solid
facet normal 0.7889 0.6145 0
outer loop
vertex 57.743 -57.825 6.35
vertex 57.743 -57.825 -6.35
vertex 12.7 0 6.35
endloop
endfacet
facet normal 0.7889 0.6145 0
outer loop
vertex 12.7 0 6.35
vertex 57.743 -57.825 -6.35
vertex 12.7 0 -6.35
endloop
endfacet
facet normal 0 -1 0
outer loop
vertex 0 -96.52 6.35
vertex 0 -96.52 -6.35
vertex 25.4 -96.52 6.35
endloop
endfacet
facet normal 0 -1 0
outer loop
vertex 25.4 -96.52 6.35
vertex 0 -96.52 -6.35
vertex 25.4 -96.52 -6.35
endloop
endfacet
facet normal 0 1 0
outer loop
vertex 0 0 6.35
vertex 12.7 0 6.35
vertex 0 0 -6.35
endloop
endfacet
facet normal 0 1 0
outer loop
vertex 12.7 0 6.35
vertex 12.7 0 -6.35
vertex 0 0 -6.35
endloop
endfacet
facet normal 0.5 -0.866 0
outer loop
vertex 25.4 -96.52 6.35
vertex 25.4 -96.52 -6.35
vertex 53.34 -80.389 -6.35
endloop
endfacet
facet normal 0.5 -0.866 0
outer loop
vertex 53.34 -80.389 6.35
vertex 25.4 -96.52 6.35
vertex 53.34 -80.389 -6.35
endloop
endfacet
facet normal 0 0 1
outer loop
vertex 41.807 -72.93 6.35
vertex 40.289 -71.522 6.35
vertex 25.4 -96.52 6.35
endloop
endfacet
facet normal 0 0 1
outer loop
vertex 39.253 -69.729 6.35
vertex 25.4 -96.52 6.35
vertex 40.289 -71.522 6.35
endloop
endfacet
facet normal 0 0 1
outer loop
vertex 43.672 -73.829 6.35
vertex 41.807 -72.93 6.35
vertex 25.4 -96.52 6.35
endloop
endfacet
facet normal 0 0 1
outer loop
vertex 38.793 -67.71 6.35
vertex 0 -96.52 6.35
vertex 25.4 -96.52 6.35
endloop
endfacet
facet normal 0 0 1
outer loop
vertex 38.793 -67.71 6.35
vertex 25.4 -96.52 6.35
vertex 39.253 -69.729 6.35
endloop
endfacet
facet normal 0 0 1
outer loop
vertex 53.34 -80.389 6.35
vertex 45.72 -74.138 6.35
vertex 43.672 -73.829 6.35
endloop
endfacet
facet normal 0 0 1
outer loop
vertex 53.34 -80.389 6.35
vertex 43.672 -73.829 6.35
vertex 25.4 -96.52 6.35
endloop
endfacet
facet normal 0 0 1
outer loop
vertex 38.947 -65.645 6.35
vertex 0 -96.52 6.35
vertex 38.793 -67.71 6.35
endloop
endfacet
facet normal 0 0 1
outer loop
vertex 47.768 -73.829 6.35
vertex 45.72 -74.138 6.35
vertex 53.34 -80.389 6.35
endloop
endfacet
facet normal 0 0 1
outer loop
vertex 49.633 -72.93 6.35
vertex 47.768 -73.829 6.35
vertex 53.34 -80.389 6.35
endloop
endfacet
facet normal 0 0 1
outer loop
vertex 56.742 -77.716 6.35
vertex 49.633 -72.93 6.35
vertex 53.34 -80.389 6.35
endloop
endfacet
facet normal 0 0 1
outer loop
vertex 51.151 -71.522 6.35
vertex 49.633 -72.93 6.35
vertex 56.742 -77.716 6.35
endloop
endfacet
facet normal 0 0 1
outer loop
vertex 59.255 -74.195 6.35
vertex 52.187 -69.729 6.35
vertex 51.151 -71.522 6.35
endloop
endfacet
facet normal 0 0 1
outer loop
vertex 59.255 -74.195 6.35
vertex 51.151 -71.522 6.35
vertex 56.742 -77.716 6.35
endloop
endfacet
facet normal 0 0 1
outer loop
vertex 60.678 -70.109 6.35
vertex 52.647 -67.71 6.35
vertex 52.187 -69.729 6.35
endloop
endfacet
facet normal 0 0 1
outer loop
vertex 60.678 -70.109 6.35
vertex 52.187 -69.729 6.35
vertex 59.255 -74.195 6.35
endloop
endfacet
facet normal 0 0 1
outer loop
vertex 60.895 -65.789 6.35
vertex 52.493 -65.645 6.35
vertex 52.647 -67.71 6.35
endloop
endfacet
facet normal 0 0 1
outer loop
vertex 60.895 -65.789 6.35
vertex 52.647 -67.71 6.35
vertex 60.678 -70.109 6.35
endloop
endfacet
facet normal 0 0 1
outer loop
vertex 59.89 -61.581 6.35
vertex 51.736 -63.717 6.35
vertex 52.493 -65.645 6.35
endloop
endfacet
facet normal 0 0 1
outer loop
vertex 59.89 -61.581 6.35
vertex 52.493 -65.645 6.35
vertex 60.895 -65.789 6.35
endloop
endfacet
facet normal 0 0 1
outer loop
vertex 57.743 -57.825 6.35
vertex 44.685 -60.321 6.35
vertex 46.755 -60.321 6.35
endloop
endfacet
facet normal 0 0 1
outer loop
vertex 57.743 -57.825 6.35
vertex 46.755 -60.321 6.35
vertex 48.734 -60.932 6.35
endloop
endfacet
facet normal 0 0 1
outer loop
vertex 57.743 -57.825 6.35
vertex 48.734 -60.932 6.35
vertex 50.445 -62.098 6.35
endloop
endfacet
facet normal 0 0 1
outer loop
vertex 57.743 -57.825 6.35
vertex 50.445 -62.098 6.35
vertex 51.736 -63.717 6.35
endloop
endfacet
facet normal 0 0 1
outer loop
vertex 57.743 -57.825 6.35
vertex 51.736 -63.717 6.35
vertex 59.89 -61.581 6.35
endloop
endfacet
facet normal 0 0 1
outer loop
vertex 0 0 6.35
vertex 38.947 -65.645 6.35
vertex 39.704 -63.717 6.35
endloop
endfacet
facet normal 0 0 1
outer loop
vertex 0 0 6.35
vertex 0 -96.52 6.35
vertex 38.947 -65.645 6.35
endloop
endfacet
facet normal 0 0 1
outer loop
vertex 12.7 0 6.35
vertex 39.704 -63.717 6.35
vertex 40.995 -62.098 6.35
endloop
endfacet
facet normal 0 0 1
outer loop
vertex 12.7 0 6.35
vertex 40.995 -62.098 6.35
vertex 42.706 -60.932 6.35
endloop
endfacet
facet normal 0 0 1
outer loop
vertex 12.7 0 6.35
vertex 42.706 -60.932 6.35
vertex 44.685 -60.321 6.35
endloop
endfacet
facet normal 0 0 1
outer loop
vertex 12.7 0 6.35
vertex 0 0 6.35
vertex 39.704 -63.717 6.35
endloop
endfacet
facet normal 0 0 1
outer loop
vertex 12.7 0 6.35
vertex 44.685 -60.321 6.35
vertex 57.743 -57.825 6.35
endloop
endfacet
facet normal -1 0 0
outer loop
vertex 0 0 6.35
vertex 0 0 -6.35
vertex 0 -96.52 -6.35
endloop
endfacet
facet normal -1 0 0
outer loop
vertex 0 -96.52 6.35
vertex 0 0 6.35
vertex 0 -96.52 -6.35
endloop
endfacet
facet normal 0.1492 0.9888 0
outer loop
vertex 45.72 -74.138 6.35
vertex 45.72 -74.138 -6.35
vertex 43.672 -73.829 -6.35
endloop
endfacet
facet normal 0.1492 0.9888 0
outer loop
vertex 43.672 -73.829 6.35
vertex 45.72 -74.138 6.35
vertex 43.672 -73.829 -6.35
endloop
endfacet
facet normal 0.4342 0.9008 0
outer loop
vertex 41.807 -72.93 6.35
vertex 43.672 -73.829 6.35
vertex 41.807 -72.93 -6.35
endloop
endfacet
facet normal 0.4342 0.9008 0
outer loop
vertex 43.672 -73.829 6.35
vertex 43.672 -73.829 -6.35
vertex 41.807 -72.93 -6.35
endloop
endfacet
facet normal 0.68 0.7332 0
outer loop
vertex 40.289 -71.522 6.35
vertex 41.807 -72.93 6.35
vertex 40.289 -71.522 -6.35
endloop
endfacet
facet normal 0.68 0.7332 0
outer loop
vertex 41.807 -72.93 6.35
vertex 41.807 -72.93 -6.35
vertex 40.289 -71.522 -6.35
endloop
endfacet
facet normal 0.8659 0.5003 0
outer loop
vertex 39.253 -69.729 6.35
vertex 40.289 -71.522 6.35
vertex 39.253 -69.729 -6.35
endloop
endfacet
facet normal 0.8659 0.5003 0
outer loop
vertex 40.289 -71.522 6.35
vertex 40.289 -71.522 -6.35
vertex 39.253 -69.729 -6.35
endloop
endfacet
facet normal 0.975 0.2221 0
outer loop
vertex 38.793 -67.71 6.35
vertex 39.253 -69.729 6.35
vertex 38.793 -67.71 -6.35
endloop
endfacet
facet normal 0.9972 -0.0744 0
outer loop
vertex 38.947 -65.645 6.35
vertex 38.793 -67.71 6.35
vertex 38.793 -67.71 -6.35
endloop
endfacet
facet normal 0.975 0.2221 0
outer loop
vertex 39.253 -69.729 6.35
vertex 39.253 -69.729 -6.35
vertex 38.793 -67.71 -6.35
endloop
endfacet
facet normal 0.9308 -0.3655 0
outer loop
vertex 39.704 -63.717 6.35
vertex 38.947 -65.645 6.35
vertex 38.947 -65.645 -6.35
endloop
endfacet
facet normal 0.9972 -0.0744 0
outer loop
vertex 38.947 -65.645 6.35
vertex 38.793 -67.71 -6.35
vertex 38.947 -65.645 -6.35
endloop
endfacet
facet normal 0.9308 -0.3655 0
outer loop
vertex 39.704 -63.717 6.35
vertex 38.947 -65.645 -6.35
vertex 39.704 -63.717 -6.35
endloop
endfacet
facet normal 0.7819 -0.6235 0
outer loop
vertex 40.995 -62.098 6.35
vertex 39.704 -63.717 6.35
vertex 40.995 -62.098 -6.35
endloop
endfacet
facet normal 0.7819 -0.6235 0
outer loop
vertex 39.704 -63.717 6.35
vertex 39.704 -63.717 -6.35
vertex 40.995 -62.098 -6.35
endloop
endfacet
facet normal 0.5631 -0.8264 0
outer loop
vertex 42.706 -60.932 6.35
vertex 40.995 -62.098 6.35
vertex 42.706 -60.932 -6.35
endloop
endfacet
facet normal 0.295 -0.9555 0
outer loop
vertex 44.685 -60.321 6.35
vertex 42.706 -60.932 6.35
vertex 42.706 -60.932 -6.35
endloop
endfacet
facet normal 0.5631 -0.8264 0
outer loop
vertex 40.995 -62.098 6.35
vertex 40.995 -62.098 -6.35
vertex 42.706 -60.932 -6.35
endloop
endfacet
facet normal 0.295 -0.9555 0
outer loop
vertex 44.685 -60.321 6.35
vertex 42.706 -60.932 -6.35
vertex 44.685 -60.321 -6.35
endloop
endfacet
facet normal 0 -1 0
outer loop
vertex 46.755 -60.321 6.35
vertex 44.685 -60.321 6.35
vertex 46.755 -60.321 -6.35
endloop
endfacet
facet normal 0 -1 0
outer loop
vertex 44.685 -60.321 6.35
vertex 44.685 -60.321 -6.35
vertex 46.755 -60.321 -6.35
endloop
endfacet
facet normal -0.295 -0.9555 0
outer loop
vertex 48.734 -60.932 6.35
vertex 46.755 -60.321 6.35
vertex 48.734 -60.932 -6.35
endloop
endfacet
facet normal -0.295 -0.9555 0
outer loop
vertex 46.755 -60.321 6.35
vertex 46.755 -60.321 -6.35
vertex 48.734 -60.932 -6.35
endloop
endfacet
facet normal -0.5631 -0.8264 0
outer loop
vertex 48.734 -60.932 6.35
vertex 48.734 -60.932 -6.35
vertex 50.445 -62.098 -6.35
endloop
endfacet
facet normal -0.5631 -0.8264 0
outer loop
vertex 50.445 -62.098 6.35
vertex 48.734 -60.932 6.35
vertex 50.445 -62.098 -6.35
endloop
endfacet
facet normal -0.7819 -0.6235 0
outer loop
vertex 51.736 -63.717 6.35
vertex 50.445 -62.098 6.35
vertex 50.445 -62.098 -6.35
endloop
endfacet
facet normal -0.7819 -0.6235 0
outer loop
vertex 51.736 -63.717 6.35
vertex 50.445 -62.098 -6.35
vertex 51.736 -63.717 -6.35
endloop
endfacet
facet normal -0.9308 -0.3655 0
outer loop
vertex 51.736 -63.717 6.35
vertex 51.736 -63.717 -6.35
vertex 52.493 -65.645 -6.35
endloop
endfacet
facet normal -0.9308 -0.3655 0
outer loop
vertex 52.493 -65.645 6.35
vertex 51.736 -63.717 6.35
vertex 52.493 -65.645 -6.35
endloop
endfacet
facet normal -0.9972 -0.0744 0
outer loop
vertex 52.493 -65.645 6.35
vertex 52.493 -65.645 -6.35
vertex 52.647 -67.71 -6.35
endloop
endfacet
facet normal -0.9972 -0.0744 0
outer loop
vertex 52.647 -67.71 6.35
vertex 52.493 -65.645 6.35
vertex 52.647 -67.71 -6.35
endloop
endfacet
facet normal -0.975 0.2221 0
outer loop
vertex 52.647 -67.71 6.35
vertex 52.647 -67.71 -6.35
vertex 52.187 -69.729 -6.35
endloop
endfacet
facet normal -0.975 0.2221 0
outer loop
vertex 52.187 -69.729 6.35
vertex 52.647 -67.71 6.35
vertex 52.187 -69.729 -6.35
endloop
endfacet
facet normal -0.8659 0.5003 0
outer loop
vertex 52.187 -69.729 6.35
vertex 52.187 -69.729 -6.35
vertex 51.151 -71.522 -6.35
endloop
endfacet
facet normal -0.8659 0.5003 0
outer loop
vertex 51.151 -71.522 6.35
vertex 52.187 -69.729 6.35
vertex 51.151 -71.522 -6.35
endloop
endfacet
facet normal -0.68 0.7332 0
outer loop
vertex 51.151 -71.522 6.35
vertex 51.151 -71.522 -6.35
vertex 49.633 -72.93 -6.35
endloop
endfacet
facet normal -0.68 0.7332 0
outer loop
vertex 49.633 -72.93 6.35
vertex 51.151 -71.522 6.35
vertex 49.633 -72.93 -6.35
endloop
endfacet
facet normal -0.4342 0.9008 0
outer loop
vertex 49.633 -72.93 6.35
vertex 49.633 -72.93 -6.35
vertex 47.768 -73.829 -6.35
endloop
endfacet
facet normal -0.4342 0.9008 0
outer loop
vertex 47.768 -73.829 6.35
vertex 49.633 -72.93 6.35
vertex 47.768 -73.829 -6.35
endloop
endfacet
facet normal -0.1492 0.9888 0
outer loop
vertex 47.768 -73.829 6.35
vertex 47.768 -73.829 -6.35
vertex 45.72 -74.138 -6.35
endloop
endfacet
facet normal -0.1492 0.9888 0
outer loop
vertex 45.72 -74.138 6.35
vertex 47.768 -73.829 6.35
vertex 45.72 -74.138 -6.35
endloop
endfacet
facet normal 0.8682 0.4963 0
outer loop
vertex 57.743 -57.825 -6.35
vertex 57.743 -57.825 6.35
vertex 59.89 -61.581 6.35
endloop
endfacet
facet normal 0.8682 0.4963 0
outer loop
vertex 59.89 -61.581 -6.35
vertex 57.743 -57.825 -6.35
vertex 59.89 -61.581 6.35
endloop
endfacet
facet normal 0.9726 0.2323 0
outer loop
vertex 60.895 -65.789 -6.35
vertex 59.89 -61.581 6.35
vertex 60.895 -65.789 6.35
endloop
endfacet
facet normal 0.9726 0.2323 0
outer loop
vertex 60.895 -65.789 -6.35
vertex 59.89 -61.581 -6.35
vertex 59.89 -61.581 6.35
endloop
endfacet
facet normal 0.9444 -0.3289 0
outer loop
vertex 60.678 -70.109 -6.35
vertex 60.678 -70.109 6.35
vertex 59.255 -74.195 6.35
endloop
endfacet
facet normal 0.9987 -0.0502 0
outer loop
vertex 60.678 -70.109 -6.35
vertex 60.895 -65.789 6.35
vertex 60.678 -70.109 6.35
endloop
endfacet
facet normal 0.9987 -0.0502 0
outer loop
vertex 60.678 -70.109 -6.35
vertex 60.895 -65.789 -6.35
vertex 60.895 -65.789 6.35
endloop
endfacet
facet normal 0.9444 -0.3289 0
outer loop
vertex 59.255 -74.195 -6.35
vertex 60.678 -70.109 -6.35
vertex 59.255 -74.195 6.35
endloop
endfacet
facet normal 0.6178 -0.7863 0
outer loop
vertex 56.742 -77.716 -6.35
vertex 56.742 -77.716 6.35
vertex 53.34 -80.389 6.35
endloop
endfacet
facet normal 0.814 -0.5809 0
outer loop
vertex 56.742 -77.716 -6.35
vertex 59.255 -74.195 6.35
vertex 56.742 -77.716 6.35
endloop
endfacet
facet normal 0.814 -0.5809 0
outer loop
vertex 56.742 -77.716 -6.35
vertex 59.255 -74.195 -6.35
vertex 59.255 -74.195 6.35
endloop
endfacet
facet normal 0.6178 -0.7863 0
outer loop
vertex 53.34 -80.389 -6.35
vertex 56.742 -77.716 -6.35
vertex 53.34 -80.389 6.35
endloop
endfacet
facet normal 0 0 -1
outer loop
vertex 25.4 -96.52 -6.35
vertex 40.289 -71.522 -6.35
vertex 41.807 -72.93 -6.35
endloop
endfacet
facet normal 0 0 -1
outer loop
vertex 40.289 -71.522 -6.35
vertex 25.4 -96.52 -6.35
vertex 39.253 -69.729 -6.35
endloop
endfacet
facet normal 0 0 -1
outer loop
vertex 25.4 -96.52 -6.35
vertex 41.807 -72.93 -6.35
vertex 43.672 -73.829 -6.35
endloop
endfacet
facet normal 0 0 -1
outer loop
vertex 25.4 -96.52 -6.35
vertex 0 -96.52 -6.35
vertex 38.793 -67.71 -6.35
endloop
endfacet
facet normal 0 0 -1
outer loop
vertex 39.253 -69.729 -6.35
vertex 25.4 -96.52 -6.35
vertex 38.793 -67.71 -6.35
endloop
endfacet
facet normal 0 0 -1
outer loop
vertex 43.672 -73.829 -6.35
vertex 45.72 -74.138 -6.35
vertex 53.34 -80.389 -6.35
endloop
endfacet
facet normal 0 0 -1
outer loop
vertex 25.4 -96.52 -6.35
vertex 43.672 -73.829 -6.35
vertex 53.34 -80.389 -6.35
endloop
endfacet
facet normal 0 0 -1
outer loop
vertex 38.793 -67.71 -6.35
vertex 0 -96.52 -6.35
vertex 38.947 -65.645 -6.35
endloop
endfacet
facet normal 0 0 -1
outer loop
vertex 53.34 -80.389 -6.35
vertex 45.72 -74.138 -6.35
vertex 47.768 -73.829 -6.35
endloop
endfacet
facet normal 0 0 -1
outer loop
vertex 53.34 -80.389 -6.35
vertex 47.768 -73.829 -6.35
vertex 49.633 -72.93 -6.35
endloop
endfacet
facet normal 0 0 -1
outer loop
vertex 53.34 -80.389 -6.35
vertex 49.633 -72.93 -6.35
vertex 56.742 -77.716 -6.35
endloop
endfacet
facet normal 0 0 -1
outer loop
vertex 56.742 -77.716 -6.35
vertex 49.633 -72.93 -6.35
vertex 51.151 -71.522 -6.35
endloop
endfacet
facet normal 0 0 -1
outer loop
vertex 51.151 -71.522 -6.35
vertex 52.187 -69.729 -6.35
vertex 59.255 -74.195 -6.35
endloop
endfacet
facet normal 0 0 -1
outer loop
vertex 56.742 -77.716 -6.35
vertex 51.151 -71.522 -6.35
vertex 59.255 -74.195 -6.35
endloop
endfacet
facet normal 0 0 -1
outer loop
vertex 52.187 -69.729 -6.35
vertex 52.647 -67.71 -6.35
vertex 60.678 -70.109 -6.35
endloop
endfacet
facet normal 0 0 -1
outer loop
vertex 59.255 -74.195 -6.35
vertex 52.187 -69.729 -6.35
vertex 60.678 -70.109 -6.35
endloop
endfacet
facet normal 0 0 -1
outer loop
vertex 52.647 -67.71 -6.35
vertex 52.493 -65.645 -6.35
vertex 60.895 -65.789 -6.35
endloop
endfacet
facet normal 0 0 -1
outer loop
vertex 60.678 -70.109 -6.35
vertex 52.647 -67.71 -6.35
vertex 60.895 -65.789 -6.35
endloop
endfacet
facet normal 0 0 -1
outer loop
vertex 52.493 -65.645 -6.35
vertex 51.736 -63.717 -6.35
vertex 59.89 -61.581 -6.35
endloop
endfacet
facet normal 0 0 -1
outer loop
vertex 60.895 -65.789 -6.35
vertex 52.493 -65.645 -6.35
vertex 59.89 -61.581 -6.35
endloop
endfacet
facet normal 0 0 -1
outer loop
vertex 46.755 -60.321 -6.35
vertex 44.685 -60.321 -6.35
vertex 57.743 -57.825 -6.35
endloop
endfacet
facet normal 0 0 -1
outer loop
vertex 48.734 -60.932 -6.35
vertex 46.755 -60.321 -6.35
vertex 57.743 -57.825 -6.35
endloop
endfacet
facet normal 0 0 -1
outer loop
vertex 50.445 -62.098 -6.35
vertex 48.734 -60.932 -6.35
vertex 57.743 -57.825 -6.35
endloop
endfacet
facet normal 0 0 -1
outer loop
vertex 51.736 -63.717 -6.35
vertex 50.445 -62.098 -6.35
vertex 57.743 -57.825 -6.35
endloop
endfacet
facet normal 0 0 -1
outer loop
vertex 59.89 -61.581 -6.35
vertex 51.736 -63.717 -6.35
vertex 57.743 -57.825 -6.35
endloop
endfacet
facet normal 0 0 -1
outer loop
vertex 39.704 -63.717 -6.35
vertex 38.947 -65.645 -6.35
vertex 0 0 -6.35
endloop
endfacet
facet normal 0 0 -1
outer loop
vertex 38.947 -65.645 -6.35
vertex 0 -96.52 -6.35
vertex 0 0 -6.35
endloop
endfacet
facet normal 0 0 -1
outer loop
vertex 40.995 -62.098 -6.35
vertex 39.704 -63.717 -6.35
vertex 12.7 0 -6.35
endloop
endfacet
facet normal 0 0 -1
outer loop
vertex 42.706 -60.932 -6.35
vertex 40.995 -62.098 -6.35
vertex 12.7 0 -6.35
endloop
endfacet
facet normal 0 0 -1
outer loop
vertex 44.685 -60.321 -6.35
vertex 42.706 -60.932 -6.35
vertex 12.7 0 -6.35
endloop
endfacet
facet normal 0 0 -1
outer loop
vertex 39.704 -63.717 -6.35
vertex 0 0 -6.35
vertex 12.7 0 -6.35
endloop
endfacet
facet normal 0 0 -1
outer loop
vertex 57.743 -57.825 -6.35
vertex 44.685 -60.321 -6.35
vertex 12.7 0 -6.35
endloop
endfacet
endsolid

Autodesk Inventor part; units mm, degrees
ref_plane "YZ Plane" through (0, 0, 0) normal (1, 0, 0) x (0, 1, 0)
ref_plane "XZ Plane" through (0, 0, 0) normal (0, 1, 0) x (-1, 0, 0)
ref_plane "Work Plane1" through (0, 0, 0) normal (0, 0, 1) x (1, 0, 0)
sketch "Sketch1" plane through (0, 0, 0) normal (0, 0, 1) x (1, 0, 0)
  line L0 (0, 0) -> (0, -96.52)
  line L1 (0, -96.52) -> (25.4, -96.52)
  line L2 (25.4, -96.52) -> (53.34, -80.3888)
  arc A0 (53.34, -80.3888) -> (57.7429, -57.8254) centre (45.72, -67.1906) ccw
  line L3 (57.7429, -57.8254) -> (12.7, 0)
  line L4 (12.7, 0) -> (0, 0)
  dimension "d0" = 96.52
  dimension "d1" = 25.4
  dimension "d2" = 60.96
  dimension "d3" = 15.24
  dimension "d4" = 12.7
  dimension "d5" = 30
extrude "Extrusion1" add sketch "Sketch1" along normal mid plane 12.7
sketch "Sketch2" plane through (0, 0, 6.35) normal (0, 0, 1) x (1, 0, 0)
  arc A0 (53.34, -80.3888) -> (57.7429, -57.8254) centre (45.72, -67.1906) ccw projected
  point P0 (0, 0)
hole "Hole1" at (45.72, -67.1906, 6.35) direction (0, 0, -1) diameter 13.8938 end through all clearance for "Flat Head Machine Screw (82)" size "1/2" standard "Ansi Unified Screw Threads"
properties part number "Catch plate"
